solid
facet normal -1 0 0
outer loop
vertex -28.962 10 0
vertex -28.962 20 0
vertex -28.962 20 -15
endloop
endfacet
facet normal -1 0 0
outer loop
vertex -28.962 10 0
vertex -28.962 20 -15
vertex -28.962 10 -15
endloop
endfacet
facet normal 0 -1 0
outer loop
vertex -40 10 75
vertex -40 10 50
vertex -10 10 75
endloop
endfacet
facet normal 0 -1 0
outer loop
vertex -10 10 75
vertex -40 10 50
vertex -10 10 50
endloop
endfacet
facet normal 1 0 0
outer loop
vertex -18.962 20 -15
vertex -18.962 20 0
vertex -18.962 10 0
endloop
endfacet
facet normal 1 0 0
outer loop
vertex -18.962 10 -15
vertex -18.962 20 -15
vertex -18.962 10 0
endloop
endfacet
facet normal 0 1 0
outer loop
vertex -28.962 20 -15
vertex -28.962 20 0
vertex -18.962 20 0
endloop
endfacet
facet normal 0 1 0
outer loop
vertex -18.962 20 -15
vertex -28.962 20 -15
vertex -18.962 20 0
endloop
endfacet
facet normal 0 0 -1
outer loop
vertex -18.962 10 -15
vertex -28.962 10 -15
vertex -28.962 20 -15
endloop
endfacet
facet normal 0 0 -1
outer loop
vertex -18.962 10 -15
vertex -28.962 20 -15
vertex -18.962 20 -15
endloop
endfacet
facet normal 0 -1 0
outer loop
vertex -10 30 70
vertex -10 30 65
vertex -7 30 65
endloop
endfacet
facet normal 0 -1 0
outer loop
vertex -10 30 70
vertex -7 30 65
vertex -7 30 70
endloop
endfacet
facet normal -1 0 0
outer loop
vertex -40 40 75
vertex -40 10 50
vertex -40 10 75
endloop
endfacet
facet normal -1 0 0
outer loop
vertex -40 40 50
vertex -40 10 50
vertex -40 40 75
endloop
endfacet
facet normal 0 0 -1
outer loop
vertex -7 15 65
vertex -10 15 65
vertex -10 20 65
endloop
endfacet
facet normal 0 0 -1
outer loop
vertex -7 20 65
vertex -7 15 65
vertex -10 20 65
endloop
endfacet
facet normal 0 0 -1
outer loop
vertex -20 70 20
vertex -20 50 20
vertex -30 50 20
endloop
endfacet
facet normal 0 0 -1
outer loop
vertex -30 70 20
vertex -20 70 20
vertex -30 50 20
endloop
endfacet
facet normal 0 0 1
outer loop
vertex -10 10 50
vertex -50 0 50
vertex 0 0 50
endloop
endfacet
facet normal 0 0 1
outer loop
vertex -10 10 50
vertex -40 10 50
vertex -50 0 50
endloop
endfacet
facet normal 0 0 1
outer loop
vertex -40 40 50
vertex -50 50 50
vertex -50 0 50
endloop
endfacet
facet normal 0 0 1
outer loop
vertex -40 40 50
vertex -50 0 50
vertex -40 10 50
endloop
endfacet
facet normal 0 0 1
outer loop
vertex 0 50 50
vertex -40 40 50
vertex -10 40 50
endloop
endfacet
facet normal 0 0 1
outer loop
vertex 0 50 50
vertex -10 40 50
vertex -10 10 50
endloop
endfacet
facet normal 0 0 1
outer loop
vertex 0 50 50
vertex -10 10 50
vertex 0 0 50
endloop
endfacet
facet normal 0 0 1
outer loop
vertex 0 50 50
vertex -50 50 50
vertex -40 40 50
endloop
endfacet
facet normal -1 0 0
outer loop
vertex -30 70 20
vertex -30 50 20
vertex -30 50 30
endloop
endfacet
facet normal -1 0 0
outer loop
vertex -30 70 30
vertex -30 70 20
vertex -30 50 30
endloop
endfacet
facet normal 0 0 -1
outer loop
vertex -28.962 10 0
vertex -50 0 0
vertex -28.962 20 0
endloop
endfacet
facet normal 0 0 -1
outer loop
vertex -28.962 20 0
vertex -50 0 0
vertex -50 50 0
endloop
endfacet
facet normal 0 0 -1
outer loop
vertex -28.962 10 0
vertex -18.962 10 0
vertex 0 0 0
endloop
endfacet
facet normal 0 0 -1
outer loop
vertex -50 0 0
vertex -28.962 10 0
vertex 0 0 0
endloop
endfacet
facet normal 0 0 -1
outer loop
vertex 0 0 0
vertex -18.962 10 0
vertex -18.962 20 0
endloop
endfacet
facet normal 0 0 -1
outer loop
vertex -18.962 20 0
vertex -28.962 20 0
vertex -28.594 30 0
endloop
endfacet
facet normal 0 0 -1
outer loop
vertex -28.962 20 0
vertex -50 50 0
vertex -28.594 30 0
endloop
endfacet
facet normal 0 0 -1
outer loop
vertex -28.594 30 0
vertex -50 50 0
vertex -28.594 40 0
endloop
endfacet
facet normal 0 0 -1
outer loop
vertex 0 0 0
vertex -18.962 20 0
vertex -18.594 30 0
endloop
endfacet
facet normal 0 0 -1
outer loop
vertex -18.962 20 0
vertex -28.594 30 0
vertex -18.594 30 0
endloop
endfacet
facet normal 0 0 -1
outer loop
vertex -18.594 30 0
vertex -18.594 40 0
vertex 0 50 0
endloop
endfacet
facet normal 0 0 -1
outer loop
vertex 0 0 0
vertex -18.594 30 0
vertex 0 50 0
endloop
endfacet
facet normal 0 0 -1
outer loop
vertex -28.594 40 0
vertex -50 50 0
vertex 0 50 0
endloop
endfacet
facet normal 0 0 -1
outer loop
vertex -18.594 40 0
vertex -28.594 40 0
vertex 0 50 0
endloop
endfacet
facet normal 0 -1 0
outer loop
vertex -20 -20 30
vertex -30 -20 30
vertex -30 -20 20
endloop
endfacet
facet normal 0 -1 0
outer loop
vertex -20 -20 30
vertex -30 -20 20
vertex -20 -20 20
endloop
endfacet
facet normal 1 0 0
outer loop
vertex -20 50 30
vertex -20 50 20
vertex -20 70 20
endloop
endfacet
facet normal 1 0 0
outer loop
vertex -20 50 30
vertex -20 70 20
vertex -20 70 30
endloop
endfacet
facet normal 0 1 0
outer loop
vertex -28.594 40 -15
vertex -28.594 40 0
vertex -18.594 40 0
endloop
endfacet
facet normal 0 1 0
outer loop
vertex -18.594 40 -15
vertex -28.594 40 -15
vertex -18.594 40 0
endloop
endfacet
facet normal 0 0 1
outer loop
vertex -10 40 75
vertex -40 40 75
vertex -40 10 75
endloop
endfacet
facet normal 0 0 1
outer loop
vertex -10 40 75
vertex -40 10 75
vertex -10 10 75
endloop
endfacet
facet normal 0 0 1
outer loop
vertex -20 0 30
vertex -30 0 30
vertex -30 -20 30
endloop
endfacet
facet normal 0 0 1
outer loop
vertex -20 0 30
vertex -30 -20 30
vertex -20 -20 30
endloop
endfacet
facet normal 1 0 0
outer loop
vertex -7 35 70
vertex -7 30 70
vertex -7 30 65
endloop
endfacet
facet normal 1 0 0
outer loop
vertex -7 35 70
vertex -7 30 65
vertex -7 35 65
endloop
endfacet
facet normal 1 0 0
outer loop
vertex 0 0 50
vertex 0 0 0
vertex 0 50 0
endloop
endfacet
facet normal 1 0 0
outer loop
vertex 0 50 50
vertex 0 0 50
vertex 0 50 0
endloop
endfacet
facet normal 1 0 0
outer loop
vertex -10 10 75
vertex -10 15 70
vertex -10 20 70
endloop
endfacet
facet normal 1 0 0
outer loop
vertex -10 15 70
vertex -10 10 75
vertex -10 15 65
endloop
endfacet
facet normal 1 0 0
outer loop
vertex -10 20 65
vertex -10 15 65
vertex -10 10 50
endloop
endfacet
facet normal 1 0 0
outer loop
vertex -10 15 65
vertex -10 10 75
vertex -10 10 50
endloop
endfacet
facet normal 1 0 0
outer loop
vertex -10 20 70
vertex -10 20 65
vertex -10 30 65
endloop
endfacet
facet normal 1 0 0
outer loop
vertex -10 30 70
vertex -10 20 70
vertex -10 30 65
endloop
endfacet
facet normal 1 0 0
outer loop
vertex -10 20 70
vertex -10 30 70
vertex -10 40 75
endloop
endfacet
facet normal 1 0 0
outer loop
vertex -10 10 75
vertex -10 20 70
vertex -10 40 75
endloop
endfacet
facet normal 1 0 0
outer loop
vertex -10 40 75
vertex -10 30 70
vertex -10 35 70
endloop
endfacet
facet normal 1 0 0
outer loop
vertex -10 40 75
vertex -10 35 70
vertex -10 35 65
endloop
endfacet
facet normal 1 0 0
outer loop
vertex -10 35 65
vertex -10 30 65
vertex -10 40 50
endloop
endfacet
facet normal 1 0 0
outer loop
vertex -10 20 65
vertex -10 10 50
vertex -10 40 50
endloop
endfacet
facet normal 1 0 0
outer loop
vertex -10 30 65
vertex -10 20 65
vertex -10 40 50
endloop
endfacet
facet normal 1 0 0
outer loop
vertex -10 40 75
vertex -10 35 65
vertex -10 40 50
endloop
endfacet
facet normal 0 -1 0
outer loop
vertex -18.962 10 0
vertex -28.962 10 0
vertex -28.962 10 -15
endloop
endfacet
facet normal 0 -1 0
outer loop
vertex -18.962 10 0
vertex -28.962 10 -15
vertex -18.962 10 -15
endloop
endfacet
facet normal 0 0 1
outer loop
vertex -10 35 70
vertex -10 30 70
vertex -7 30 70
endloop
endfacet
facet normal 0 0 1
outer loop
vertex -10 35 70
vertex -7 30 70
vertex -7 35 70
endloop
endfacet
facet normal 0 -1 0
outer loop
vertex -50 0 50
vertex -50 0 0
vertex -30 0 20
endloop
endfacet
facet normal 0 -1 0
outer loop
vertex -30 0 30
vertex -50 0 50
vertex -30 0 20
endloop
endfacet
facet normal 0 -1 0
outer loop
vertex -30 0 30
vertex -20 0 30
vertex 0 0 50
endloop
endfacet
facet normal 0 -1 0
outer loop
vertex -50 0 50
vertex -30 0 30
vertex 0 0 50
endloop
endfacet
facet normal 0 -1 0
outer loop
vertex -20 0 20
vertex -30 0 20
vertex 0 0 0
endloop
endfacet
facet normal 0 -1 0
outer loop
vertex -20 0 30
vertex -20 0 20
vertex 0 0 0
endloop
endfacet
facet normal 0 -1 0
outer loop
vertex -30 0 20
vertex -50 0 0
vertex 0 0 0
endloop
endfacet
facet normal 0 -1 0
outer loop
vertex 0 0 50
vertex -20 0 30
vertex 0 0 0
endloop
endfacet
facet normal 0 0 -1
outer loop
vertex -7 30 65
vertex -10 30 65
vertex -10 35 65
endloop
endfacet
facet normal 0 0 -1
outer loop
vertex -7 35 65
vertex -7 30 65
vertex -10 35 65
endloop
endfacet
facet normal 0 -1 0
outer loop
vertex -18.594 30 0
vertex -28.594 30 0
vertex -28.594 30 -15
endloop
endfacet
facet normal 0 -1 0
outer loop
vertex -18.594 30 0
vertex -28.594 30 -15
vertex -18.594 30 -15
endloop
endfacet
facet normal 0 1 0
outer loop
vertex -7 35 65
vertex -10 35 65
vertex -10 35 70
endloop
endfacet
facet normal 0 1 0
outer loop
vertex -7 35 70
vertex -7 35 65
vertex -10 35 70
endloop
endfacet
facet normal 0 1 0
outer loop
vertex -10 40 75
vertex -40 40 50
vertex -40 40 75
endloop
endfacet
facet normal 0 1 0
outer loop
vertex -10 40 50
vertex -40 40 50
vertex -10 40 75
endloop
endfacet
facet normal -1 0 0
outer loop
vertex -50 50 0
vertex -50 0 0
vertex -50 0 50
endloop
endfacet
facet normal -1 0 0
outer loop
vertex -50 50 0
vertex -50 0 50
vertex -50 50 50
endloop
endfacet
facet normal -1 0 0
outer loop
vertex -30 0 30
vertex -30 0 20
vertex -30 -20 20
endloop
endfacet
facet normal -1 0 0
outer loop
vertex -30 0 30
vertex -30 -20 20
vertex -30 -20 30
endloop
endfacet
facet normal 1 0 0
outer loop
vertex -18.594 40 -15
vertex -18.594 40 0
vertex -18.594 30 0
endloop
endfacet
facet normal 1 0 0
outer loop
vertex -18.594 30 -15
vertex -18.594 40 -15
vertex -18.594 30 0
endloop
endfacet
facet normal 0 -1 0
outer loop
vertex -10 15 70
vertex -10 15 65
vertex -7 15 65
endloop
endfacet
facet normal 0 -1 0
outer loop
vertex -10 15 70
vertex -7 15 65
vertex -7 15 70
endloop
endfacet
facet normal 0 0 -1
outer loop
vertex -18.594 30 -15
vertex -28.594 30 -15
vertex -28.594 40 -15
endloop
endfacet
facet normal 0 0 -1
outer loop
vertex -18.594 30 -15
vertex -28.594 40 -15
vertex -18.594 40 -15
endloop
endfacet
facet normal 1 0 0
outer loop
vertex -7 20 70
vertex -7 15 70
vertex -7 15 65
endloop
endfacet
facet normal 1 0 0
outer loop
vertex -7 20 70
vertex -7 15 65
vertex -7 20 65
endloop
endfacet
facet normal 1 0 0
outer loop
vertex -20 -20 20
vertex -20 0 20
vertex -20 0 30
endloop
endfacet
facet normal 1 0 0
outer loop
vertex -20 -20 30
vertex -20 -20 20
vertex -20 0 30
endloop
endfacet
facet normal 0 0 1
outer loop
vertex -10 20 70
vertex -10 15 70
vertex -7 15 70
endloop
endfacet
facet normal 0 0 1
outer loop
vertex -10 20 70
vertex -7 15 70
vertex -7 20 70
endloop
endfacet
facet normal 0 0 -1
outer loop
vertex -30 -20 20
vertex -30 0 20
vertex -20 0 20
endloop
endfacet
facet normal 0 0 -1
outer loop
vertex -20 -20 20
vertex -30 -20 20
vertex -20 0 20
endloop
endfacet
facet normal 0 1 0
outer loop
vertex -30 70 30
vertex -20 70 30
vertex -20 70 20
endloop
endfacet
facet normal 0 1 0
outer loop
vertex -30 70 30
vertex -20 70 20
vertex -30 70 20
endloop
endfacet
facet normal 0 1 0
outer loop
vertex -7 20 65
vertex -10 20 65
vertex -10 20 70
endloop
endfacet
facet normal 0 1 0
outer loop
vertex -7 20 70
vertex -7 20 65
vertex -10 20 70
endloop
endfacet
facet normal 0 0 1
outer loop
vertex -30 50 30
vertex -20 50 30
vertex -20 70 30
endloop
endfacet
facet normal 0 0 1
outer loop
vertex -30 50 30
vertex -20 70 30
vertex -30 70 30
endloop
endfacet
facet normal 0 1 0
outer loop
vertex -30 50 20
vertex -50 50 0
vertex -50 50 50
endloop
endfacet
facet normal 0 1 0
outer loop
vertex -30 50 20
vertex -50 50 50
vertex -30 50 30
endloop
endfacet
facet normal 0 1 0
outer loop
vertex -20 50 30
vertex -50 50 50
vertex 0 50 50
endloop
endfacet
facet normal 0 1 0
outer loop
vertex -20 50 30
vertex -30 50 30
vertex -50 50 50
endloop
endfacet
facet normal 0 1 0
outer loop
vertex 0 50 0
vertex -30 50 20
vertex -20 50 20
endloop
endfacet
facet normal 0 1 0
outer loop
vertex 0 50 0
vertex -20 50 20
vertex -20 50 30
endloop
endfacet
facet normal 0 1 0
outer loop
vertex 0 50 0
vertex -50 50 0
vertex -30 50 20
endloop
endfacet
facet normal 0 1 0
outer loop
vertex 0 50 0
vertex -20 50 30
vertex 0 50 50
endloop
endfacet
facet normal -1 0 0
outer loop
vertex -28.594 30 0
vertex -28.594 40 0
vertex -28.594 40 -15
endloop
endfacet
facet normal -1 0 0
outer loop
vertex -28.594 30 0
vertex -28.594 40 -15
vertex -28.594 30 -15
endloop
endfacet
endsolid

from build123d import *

# Parameters (mm, degrees)
F0_W      = 50
F0_H      = 50
F1_DEPTH  = 50
F2_W      = 30
F2_H      = 30
F3_DEPTH  = 25
F4_W      = 10
F4_H      = 10
F5_DEPTH  = 20
F6_W      = 10
F6_H      = 10
F7_DEPTH  = 20
F8_W      = 10
F8_H      = 10
F9_DEPTH  = 15
F10_W     = 5
F10_H     = 5
F11_DEPTH = 3


with BuildPart() as f1:
    # F0 (on Top) → F1 (new body)
    with BuildSketch(Plane.XY):
        with Locations((-25, 25)):
            Rectangle(F0_W, F0_H)
    extrude(amount=F1_DEPTH)

    # F2 (on face) → F3 (join)
    with BuildSketch(Plane.XY.offset(50)):
        with Locations((-25, 25)):
            Rectangle(F2_W, F2_H)
    extrude(amount=F3_DEPTH)

    # F4 (on face) → F5 (join)
    with BuildSketch(Plane.XZ):
        with Locations((-25, 25)):
            Rectangle(F4_W, F4_H)
    extrude(amount=F5_DEPTH)

    # F6 (on face) → F7 (join)
    with BuildSketch(Plane(origin=(0, 50, 0), x_dir=(-1, 0, 0), z_dir=(0, 1, 0))):
        with Locations((25, 25)):
            Rectangle(F6_W, F6_H)
    extrude(amount=F7_DEPTH)

    # F8 (on face) → F9 (join)
    with BuildSketch(Plane(origin=(0, 0, 0), x_dir=(1, 0, 0), z_dir=(0, 0, -1))):
        with Locations((-23.593899, -35)):
            Rectangle(F8_W, F8_H)
        with Locations((-23.962104, -15)):
            Rectangle(F8_W, F8_H)
    extrude(amount=F9_DEPTH)

    # F10 (on face) → F11 (join)
    with BuildSketch(Plane.YZ.offset(-10)):
        with Locations((17.5, 67.5)):
            Rectangle(F10_W, F10_H)
        with Locations((32.5, 67.5)):
            Rectangle(F10_W, F10_H)
    extrude(amount=F11_DEPTH)


solid = f1.part
